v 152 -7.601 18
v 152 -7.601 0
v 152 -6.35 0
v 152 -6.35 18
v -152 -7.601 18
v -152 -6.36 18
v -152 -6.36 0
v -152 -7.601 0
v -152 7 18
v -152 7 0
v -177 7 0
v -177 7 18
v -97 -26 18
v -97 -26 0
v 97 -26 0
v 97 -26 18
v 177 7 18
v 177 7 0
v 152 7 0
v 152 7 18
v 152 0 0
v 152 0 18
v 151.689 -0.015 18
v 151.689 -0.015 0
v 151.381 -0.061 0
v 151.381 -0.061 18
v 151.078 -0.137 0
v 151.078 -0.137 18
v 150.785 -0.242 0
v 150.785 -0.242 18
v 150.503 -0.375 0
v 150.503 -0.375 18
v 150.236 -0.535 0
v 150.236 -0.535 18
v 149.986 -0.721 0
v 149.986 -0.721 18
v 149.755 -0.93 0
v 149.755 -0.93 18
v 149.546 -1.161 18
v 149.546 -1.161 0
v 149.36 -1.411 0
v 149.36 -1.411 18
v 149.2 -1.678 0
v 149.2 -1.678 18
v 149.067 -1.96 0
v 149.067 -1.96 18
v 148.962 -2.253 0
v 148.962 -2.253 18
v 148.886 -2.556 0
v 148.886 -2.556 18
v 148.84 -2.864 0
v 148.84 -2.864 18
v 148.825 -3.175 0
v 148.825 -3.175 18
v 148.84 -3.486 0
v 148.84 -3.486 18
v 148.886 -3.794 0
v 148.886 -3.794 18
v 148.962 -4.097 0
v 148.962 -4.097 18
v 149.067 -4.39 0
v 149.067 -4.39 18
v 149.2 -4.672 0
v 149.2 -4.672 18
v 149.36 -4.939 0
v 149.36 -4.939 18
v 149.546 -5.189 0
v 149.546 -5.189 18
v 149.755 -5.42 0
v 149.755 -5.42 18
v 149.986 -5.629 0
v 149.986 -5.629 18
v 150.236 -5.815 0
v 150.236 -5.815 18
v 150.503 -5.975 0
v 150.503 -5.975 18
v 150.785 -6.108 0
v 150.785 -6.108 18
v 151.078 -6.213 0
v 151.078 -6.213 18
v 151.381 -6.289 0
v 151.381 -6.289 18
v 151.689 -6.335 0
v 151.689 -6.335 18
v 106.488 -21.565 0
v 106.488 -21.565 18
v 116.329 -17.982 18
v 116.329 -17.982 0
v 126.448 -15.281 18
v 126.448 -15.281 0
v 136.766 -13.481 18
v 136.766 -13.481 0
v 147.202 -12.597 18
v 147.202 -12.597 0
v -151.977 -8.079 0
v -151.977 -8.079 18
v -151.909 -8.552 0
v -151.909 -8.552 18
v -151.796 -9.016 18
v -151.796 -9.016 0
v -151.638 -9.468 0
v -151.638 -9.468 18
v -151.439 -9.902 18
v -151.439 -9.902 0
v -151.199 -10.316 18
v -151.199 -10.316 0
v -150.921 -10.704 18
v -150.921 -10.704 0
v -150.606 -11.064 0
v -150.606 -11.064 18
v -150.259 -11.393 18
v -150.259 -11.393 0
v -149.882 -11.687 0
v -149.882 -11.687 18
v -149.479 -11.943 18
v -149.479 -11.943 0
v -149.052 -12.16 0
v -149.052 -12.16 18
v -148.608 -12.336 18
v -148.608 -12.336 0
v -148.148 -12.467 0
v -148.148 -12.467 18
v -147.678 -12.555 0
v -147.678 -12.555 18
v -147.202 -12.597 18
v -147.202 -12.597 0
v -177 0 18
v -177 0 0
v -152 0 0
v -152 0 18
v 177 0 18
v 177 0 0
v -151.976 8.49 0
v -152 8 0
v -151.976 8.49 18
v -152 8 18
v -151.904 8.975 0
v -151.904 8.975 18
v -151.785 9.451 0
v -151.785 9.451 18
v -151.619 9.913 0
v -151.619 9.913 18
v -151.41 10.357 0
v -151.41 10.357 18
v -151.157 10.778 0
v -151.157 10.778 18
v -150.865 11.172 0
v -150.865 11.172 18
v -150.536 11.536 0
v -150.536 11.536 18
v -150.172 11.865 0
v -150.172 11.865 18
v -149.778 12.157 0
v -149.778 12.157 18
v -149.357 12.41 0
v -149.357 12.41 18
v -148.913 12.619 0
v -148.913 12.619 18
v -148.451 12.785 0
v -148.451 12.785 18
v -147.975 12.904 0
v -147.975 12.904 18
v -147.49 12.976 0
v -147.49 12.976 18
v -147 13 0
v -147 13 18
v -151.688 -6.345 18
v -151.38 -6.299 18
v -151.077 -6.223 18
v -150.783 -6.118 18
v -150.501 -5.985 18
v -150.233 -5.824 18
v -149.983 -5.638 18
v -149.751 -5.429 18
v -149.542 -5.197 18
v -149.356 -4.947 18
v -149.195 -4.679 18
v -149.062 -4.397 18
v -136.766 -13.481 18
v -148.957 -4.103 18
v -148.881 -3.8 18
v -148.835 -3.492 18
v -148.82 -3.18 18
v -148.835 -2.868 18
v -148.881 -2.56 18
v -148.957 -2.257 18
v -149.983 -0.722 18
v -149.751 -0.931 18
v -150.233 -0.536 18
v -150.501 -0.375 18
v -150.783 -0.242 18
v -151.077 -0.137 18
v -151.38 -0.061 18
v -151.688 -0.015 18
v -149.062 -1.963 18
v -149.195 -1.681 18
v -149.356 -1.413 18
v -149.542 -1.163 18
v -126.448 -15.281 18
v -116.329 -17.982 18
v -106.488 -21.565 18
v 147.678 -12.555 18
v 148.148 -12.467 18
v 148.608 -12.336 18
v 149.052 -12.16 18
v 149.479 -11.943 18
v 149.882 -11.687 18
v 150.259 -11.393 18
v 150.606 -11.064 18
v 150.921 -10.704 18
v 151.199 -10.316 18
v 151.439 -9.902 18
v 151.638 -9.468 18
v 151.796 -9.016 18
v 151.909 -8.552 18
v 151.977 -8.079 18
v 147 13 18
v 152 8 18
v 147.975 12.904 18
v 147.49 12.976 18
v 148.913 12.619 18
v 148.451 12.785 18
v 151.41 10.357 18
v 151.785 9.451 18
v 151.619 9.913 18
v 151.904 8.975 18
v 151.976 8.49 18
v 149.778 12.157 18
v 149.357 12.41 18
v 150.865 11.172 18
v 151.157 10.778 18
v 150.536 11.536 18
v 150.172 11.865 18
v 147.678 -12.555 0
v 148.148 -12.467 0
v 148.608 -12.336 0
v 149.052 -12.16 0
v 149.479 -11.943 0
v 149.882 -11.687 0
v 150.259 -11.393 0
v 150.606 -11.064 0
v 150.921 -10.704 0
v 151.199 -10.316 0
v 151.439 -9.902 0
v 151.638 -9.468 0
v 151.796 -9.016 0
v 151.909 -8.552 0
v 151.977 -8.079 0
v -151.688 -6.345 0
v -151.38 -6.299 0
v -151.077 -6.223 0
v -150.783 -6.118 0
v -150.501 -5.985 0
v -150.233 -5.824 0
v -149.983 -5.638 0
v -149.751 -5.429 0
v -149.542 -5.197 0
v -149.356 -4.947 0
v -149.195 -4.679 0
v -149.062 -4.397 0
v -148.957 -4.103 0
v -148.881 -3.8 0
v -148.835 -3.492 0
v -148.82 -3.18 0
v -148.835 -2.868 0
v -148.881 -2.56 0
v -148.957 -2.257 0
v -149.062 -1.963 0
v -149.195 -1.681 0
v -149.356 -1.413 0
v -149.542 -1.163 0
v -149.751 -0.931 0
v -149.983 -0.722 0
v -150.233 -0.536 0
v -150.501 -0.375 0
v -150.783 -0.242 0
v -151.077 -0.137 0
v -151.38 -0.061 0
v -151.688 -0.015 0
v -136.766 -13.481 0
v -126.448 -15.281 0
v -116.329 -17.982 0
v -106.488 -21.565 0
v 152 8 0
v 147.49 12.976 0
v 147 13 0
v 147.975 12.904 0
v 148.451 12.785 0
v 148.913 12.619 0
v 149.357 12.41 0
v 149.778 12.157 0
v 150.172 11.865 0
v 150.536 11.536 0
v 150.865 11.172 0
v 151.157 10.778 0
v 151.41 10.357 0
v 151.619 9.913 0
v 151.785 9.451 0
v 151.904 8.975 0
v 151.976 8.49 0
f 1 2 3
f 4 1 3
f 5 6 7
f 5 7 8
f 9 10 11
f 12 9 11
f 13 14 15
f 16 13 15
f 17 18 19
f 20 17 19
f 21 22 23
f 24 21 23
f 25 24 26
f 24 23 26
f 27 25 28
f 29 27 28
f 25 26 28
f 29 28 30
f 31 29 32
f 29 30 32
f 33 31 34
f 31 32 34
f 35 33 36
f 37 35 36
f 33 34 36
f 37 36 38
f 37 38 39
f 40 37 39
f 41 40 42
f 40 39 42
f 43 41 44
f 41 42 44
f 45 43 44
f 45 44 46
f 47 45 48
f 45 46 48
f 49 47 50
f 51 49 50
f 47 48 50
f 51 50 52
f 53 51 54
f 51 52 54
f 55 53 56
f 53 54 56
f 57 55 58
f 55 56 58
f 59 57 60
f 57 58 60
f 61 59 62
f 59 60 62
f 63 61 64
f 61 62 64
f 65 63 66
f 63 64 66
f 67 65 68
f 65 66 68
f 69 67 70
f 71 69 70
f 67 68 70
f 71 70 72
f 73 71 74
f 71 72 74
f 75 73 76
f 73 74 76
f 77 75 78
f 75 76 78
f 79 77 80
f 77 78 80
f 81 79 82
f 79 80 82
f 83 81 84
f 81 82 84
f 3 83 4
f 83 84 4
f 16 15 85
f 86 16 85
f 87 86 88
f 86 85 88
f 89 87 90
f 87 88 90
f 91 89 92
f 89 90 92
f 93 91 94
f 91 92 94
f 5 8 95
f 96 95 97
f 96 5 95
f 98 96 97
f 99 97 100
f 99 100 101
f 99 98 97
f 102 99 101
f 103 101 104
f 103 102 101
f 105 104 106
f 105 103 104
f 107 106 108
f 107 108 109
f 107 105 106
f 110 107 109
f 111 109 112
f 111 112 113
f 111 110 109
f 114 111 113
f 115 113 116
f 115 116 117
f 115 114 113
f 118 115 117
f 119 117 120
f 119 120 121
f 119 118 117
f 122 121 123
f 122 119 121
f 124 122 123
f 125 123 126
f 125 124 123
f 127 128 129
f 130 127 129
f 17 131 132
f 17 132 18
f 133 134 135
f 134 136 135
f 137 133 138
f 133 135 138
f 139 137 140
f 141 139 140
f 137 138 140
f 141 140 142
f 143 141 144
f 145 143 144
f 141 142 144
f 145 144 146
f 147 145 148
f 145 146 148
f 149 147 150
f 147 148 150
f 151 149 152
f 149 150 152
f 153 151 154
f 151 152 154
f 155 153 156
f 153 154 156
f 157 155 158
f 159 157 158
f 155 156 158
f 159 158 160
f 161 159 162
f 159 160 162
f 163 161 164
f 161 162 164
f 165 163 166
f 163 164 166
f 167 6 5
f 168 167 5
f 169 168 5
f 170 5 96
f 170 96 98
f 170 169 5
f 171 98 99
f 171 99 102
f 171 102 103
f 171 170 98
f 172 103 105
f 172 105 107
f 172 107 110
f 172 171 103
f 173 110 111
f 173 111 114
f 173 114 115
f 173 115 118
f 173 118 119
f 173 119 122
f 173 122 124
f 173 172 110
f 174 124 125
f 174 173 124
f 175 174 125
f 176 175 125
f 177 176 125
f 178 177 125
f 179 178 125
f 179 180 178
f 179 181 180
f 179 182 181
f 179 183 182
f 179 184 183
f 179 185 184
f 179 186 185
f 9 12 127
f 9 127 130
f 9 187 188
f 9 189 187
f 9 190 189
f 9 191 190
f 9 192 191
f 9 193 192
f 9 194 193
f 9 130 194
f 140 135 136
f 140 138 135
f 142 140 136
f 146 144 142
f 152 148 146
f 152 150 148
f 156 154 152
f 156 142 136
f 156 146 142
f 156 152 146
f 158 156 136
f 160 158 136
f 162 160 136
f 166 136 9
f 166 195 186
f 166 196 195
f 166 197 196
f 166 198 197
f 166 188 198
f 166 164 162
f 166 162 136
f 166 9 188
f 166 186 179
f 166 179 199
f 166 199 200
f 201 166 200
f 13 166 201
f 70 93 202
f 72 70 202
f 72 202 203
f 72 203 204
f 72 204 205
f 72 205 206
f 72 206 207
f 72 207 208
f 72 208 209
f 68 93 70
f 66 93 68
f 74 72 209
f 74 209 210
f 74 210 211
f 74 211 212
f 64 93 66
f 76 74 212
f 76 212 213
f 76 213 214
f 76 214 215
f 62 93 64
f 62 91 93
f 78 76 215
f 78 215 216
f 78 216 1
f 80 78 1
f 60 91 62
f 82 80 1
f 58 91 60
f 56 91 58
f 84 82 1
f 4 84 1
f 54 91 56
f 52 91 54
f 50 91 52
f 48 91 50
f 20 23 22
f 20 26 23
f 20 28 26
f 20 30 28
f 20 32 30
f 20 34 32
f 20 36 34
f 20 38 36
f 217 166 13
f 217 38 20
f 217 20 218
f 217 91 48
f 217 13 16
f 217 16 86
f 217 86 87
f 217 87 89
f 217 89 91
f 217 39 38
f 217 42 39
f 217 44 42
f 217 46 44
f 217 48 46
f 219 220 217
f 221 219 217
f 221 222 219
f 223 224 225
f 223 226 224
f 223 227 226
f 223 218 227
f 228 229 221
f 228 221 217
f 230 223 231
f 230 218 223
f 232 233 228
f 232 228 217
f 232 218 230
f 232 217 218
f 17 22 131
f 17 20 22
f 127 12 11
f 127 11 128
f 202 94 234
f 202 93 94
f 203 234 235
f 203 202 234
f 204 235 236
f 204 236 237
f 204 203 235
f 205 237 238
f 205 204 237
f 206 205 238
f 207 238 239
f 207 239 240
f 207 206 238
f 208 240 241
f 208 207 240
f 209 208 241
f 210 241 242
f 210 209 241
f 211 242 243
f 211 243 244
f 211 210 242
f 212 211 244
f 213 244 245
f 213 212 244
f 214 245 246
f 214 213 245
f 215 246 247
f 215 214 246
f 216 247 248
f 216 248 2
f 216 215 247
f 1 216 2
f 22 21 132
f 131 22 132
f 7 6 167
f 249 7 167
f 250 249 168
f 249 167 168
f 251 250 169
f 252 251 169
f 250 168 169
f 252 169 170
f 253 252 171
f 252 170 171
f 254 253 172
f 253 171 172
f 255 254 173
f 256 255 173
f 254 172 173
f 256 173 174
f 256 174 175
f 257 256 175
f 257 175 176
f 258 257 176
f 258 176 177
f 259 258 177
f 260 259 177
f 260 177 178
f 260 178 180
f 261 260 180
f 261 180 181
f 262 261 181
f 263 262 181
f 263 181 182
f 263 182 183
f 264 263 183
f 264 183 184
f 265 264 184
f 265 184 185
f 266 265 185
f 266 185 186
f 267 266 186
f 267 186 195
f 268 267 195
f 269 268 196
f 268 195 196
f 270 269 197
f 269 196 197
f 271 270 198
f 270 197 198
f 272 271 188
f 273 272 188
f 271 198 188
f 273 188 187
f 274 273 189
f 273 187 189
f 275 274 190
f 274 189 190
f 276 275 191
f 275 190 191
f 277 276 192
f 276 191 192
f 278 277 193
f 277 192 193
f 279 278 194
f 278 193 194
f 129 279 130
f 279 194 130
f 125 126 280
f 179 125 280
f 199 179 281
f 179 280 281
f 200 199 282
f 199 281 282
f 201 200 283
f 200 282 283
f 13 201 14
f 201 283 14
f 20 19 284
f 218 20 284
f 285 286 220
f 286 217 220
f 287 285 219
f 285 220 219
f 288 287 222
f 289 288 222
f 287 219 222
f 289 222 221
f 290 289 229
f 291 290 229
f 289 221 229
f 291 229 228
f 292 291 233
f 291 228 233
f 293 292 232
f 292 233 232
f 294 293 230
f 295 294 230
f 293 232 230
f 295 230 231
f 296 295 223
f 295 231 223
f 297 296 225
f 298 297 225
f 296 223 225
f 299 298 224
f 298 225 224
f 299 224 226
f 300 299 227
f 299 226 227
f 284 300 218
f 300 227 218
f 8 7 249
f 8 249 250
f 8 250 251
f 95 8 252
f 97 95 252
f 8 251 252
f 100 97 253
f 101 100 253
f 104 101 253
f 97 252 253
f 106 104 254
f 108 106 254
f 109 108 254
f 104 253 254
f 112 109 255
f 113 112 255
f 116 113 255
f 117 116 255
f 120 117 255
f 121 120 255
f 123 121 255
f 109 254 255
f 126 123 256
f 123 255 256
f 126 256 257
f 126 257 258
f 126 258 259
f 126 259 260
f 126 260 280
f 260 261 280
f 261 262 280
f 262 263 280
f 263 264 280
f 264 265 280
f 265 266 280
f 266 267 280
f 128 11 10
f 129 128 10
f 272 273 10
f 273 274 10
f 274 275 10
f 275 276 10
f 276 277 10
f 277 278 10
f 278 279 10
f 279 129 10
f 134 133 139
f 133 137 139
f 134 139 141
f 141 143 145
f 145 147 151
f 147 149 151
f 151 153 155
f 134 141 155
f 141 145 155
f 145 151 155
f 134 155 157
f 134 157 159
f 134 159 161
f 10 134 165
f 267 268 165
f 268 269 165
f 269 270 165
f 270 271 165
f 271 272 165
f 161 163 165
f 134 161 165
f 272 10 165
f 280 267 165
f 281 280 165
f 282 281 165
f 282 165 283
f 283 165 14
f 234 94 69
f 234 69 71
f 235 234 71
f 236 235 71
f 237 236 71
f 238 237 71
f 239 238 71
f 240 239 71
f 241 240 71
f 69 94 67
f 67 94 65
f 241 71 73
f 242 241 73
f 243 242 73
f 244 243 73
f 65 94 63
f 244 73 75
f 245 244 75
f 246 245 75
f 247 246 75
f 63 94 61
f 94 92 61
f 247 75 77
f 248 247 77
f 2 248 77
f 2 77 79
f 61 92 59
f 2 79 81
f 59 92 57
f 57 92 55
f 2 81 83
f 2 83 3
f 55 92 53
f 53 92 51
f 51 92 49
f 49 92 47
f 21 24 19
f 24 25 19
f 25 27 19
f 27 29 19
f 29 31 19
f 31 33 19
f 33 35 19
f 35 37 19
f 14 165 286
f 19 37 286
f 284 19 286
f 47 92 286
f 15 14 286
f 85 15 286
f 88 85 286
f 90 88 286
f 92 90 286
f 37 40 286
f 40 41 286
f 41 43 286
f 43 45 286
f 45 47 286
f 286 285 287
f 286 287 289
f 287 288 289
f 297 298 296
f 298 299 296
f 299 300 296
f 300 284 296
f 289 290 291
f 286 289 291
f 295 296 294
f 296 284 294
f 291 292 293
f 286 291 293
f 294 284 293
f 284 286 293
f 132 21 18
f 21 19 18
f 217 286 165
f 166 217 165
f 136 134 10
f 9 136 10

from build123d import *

# Parameters (mm, degrees)
F1_DEPTH = 18
F2_R     = 5
F4_DEPTH = 18.001
F5_R     = 5


with BuildPart() as f1:
    # F0 (on Top) → F1 (new body)
    with BuildSketch(Plane.XY):
        with BuildLine():
            Line((-177, 7), (-177, 0))
            Line((-177, 0), (-152, 0))
            Line((-152, 0), (-152, -12.5))
            ThreePointArc((-152, -12.5), (-123.683706, -15.924358), (-97, -26))
            Line((-97, -26), (0, -26))
            Line((0, -26), (97, -26))
            ThreePointArc((97, -26), (123.683706, -15.924358), (152, -12.5))
            Line((152, -12.5), (152, 0))
            Line((152, 0), (177, 0))
            Line((177, 0), (177, 7))
            Line((177, 7), (152, 7))
            Line((152, 7), (152, 13))
            Line((152, 13), (0, 13))
            Line((0, 13), (-152, 13))
            Line((-152, 13), (-152, 7))
            Line((-152, 7), (-177, 7))
        make_face()
    extrude(amount=F1_DEPTH)

    # F2
    f2_edges = [f1.edges().sort_by_distance(p)[0] for p in [
        (-152, -12.5, 9),
        (152, -12.5, 9),
    ]]
    fillet(f2_edges, radius=F2_R)

    # F3 (on face) → F4 (cut, through all)
    with BuildSketch(Plane.XY.offset(18)):
        with BuildLine():
            ThreePointArc((152, 0), (148.825, -3.175), (152, -6.35))
            Line((152, -6.35), (152, 0))
        make_face()
        with BuildLine():
            Line((-152, 0), (-152, -6.36))
            ThreePointArc((-152, -6.36), (-148.82, -3.18), (-152, 0))
        make_face()
    extrude(amount=-F4_DEPTH, mode=Mode.SUBTRACT)

    # F5
    f5_edges = [f1.edges().sort_by_distance(p)[0] for p in [
        (-152, 13, 9),
        (152, 13, 9),
    ]]
    fillet(f5_edges, radius=F5_R)


solid = f1.part
